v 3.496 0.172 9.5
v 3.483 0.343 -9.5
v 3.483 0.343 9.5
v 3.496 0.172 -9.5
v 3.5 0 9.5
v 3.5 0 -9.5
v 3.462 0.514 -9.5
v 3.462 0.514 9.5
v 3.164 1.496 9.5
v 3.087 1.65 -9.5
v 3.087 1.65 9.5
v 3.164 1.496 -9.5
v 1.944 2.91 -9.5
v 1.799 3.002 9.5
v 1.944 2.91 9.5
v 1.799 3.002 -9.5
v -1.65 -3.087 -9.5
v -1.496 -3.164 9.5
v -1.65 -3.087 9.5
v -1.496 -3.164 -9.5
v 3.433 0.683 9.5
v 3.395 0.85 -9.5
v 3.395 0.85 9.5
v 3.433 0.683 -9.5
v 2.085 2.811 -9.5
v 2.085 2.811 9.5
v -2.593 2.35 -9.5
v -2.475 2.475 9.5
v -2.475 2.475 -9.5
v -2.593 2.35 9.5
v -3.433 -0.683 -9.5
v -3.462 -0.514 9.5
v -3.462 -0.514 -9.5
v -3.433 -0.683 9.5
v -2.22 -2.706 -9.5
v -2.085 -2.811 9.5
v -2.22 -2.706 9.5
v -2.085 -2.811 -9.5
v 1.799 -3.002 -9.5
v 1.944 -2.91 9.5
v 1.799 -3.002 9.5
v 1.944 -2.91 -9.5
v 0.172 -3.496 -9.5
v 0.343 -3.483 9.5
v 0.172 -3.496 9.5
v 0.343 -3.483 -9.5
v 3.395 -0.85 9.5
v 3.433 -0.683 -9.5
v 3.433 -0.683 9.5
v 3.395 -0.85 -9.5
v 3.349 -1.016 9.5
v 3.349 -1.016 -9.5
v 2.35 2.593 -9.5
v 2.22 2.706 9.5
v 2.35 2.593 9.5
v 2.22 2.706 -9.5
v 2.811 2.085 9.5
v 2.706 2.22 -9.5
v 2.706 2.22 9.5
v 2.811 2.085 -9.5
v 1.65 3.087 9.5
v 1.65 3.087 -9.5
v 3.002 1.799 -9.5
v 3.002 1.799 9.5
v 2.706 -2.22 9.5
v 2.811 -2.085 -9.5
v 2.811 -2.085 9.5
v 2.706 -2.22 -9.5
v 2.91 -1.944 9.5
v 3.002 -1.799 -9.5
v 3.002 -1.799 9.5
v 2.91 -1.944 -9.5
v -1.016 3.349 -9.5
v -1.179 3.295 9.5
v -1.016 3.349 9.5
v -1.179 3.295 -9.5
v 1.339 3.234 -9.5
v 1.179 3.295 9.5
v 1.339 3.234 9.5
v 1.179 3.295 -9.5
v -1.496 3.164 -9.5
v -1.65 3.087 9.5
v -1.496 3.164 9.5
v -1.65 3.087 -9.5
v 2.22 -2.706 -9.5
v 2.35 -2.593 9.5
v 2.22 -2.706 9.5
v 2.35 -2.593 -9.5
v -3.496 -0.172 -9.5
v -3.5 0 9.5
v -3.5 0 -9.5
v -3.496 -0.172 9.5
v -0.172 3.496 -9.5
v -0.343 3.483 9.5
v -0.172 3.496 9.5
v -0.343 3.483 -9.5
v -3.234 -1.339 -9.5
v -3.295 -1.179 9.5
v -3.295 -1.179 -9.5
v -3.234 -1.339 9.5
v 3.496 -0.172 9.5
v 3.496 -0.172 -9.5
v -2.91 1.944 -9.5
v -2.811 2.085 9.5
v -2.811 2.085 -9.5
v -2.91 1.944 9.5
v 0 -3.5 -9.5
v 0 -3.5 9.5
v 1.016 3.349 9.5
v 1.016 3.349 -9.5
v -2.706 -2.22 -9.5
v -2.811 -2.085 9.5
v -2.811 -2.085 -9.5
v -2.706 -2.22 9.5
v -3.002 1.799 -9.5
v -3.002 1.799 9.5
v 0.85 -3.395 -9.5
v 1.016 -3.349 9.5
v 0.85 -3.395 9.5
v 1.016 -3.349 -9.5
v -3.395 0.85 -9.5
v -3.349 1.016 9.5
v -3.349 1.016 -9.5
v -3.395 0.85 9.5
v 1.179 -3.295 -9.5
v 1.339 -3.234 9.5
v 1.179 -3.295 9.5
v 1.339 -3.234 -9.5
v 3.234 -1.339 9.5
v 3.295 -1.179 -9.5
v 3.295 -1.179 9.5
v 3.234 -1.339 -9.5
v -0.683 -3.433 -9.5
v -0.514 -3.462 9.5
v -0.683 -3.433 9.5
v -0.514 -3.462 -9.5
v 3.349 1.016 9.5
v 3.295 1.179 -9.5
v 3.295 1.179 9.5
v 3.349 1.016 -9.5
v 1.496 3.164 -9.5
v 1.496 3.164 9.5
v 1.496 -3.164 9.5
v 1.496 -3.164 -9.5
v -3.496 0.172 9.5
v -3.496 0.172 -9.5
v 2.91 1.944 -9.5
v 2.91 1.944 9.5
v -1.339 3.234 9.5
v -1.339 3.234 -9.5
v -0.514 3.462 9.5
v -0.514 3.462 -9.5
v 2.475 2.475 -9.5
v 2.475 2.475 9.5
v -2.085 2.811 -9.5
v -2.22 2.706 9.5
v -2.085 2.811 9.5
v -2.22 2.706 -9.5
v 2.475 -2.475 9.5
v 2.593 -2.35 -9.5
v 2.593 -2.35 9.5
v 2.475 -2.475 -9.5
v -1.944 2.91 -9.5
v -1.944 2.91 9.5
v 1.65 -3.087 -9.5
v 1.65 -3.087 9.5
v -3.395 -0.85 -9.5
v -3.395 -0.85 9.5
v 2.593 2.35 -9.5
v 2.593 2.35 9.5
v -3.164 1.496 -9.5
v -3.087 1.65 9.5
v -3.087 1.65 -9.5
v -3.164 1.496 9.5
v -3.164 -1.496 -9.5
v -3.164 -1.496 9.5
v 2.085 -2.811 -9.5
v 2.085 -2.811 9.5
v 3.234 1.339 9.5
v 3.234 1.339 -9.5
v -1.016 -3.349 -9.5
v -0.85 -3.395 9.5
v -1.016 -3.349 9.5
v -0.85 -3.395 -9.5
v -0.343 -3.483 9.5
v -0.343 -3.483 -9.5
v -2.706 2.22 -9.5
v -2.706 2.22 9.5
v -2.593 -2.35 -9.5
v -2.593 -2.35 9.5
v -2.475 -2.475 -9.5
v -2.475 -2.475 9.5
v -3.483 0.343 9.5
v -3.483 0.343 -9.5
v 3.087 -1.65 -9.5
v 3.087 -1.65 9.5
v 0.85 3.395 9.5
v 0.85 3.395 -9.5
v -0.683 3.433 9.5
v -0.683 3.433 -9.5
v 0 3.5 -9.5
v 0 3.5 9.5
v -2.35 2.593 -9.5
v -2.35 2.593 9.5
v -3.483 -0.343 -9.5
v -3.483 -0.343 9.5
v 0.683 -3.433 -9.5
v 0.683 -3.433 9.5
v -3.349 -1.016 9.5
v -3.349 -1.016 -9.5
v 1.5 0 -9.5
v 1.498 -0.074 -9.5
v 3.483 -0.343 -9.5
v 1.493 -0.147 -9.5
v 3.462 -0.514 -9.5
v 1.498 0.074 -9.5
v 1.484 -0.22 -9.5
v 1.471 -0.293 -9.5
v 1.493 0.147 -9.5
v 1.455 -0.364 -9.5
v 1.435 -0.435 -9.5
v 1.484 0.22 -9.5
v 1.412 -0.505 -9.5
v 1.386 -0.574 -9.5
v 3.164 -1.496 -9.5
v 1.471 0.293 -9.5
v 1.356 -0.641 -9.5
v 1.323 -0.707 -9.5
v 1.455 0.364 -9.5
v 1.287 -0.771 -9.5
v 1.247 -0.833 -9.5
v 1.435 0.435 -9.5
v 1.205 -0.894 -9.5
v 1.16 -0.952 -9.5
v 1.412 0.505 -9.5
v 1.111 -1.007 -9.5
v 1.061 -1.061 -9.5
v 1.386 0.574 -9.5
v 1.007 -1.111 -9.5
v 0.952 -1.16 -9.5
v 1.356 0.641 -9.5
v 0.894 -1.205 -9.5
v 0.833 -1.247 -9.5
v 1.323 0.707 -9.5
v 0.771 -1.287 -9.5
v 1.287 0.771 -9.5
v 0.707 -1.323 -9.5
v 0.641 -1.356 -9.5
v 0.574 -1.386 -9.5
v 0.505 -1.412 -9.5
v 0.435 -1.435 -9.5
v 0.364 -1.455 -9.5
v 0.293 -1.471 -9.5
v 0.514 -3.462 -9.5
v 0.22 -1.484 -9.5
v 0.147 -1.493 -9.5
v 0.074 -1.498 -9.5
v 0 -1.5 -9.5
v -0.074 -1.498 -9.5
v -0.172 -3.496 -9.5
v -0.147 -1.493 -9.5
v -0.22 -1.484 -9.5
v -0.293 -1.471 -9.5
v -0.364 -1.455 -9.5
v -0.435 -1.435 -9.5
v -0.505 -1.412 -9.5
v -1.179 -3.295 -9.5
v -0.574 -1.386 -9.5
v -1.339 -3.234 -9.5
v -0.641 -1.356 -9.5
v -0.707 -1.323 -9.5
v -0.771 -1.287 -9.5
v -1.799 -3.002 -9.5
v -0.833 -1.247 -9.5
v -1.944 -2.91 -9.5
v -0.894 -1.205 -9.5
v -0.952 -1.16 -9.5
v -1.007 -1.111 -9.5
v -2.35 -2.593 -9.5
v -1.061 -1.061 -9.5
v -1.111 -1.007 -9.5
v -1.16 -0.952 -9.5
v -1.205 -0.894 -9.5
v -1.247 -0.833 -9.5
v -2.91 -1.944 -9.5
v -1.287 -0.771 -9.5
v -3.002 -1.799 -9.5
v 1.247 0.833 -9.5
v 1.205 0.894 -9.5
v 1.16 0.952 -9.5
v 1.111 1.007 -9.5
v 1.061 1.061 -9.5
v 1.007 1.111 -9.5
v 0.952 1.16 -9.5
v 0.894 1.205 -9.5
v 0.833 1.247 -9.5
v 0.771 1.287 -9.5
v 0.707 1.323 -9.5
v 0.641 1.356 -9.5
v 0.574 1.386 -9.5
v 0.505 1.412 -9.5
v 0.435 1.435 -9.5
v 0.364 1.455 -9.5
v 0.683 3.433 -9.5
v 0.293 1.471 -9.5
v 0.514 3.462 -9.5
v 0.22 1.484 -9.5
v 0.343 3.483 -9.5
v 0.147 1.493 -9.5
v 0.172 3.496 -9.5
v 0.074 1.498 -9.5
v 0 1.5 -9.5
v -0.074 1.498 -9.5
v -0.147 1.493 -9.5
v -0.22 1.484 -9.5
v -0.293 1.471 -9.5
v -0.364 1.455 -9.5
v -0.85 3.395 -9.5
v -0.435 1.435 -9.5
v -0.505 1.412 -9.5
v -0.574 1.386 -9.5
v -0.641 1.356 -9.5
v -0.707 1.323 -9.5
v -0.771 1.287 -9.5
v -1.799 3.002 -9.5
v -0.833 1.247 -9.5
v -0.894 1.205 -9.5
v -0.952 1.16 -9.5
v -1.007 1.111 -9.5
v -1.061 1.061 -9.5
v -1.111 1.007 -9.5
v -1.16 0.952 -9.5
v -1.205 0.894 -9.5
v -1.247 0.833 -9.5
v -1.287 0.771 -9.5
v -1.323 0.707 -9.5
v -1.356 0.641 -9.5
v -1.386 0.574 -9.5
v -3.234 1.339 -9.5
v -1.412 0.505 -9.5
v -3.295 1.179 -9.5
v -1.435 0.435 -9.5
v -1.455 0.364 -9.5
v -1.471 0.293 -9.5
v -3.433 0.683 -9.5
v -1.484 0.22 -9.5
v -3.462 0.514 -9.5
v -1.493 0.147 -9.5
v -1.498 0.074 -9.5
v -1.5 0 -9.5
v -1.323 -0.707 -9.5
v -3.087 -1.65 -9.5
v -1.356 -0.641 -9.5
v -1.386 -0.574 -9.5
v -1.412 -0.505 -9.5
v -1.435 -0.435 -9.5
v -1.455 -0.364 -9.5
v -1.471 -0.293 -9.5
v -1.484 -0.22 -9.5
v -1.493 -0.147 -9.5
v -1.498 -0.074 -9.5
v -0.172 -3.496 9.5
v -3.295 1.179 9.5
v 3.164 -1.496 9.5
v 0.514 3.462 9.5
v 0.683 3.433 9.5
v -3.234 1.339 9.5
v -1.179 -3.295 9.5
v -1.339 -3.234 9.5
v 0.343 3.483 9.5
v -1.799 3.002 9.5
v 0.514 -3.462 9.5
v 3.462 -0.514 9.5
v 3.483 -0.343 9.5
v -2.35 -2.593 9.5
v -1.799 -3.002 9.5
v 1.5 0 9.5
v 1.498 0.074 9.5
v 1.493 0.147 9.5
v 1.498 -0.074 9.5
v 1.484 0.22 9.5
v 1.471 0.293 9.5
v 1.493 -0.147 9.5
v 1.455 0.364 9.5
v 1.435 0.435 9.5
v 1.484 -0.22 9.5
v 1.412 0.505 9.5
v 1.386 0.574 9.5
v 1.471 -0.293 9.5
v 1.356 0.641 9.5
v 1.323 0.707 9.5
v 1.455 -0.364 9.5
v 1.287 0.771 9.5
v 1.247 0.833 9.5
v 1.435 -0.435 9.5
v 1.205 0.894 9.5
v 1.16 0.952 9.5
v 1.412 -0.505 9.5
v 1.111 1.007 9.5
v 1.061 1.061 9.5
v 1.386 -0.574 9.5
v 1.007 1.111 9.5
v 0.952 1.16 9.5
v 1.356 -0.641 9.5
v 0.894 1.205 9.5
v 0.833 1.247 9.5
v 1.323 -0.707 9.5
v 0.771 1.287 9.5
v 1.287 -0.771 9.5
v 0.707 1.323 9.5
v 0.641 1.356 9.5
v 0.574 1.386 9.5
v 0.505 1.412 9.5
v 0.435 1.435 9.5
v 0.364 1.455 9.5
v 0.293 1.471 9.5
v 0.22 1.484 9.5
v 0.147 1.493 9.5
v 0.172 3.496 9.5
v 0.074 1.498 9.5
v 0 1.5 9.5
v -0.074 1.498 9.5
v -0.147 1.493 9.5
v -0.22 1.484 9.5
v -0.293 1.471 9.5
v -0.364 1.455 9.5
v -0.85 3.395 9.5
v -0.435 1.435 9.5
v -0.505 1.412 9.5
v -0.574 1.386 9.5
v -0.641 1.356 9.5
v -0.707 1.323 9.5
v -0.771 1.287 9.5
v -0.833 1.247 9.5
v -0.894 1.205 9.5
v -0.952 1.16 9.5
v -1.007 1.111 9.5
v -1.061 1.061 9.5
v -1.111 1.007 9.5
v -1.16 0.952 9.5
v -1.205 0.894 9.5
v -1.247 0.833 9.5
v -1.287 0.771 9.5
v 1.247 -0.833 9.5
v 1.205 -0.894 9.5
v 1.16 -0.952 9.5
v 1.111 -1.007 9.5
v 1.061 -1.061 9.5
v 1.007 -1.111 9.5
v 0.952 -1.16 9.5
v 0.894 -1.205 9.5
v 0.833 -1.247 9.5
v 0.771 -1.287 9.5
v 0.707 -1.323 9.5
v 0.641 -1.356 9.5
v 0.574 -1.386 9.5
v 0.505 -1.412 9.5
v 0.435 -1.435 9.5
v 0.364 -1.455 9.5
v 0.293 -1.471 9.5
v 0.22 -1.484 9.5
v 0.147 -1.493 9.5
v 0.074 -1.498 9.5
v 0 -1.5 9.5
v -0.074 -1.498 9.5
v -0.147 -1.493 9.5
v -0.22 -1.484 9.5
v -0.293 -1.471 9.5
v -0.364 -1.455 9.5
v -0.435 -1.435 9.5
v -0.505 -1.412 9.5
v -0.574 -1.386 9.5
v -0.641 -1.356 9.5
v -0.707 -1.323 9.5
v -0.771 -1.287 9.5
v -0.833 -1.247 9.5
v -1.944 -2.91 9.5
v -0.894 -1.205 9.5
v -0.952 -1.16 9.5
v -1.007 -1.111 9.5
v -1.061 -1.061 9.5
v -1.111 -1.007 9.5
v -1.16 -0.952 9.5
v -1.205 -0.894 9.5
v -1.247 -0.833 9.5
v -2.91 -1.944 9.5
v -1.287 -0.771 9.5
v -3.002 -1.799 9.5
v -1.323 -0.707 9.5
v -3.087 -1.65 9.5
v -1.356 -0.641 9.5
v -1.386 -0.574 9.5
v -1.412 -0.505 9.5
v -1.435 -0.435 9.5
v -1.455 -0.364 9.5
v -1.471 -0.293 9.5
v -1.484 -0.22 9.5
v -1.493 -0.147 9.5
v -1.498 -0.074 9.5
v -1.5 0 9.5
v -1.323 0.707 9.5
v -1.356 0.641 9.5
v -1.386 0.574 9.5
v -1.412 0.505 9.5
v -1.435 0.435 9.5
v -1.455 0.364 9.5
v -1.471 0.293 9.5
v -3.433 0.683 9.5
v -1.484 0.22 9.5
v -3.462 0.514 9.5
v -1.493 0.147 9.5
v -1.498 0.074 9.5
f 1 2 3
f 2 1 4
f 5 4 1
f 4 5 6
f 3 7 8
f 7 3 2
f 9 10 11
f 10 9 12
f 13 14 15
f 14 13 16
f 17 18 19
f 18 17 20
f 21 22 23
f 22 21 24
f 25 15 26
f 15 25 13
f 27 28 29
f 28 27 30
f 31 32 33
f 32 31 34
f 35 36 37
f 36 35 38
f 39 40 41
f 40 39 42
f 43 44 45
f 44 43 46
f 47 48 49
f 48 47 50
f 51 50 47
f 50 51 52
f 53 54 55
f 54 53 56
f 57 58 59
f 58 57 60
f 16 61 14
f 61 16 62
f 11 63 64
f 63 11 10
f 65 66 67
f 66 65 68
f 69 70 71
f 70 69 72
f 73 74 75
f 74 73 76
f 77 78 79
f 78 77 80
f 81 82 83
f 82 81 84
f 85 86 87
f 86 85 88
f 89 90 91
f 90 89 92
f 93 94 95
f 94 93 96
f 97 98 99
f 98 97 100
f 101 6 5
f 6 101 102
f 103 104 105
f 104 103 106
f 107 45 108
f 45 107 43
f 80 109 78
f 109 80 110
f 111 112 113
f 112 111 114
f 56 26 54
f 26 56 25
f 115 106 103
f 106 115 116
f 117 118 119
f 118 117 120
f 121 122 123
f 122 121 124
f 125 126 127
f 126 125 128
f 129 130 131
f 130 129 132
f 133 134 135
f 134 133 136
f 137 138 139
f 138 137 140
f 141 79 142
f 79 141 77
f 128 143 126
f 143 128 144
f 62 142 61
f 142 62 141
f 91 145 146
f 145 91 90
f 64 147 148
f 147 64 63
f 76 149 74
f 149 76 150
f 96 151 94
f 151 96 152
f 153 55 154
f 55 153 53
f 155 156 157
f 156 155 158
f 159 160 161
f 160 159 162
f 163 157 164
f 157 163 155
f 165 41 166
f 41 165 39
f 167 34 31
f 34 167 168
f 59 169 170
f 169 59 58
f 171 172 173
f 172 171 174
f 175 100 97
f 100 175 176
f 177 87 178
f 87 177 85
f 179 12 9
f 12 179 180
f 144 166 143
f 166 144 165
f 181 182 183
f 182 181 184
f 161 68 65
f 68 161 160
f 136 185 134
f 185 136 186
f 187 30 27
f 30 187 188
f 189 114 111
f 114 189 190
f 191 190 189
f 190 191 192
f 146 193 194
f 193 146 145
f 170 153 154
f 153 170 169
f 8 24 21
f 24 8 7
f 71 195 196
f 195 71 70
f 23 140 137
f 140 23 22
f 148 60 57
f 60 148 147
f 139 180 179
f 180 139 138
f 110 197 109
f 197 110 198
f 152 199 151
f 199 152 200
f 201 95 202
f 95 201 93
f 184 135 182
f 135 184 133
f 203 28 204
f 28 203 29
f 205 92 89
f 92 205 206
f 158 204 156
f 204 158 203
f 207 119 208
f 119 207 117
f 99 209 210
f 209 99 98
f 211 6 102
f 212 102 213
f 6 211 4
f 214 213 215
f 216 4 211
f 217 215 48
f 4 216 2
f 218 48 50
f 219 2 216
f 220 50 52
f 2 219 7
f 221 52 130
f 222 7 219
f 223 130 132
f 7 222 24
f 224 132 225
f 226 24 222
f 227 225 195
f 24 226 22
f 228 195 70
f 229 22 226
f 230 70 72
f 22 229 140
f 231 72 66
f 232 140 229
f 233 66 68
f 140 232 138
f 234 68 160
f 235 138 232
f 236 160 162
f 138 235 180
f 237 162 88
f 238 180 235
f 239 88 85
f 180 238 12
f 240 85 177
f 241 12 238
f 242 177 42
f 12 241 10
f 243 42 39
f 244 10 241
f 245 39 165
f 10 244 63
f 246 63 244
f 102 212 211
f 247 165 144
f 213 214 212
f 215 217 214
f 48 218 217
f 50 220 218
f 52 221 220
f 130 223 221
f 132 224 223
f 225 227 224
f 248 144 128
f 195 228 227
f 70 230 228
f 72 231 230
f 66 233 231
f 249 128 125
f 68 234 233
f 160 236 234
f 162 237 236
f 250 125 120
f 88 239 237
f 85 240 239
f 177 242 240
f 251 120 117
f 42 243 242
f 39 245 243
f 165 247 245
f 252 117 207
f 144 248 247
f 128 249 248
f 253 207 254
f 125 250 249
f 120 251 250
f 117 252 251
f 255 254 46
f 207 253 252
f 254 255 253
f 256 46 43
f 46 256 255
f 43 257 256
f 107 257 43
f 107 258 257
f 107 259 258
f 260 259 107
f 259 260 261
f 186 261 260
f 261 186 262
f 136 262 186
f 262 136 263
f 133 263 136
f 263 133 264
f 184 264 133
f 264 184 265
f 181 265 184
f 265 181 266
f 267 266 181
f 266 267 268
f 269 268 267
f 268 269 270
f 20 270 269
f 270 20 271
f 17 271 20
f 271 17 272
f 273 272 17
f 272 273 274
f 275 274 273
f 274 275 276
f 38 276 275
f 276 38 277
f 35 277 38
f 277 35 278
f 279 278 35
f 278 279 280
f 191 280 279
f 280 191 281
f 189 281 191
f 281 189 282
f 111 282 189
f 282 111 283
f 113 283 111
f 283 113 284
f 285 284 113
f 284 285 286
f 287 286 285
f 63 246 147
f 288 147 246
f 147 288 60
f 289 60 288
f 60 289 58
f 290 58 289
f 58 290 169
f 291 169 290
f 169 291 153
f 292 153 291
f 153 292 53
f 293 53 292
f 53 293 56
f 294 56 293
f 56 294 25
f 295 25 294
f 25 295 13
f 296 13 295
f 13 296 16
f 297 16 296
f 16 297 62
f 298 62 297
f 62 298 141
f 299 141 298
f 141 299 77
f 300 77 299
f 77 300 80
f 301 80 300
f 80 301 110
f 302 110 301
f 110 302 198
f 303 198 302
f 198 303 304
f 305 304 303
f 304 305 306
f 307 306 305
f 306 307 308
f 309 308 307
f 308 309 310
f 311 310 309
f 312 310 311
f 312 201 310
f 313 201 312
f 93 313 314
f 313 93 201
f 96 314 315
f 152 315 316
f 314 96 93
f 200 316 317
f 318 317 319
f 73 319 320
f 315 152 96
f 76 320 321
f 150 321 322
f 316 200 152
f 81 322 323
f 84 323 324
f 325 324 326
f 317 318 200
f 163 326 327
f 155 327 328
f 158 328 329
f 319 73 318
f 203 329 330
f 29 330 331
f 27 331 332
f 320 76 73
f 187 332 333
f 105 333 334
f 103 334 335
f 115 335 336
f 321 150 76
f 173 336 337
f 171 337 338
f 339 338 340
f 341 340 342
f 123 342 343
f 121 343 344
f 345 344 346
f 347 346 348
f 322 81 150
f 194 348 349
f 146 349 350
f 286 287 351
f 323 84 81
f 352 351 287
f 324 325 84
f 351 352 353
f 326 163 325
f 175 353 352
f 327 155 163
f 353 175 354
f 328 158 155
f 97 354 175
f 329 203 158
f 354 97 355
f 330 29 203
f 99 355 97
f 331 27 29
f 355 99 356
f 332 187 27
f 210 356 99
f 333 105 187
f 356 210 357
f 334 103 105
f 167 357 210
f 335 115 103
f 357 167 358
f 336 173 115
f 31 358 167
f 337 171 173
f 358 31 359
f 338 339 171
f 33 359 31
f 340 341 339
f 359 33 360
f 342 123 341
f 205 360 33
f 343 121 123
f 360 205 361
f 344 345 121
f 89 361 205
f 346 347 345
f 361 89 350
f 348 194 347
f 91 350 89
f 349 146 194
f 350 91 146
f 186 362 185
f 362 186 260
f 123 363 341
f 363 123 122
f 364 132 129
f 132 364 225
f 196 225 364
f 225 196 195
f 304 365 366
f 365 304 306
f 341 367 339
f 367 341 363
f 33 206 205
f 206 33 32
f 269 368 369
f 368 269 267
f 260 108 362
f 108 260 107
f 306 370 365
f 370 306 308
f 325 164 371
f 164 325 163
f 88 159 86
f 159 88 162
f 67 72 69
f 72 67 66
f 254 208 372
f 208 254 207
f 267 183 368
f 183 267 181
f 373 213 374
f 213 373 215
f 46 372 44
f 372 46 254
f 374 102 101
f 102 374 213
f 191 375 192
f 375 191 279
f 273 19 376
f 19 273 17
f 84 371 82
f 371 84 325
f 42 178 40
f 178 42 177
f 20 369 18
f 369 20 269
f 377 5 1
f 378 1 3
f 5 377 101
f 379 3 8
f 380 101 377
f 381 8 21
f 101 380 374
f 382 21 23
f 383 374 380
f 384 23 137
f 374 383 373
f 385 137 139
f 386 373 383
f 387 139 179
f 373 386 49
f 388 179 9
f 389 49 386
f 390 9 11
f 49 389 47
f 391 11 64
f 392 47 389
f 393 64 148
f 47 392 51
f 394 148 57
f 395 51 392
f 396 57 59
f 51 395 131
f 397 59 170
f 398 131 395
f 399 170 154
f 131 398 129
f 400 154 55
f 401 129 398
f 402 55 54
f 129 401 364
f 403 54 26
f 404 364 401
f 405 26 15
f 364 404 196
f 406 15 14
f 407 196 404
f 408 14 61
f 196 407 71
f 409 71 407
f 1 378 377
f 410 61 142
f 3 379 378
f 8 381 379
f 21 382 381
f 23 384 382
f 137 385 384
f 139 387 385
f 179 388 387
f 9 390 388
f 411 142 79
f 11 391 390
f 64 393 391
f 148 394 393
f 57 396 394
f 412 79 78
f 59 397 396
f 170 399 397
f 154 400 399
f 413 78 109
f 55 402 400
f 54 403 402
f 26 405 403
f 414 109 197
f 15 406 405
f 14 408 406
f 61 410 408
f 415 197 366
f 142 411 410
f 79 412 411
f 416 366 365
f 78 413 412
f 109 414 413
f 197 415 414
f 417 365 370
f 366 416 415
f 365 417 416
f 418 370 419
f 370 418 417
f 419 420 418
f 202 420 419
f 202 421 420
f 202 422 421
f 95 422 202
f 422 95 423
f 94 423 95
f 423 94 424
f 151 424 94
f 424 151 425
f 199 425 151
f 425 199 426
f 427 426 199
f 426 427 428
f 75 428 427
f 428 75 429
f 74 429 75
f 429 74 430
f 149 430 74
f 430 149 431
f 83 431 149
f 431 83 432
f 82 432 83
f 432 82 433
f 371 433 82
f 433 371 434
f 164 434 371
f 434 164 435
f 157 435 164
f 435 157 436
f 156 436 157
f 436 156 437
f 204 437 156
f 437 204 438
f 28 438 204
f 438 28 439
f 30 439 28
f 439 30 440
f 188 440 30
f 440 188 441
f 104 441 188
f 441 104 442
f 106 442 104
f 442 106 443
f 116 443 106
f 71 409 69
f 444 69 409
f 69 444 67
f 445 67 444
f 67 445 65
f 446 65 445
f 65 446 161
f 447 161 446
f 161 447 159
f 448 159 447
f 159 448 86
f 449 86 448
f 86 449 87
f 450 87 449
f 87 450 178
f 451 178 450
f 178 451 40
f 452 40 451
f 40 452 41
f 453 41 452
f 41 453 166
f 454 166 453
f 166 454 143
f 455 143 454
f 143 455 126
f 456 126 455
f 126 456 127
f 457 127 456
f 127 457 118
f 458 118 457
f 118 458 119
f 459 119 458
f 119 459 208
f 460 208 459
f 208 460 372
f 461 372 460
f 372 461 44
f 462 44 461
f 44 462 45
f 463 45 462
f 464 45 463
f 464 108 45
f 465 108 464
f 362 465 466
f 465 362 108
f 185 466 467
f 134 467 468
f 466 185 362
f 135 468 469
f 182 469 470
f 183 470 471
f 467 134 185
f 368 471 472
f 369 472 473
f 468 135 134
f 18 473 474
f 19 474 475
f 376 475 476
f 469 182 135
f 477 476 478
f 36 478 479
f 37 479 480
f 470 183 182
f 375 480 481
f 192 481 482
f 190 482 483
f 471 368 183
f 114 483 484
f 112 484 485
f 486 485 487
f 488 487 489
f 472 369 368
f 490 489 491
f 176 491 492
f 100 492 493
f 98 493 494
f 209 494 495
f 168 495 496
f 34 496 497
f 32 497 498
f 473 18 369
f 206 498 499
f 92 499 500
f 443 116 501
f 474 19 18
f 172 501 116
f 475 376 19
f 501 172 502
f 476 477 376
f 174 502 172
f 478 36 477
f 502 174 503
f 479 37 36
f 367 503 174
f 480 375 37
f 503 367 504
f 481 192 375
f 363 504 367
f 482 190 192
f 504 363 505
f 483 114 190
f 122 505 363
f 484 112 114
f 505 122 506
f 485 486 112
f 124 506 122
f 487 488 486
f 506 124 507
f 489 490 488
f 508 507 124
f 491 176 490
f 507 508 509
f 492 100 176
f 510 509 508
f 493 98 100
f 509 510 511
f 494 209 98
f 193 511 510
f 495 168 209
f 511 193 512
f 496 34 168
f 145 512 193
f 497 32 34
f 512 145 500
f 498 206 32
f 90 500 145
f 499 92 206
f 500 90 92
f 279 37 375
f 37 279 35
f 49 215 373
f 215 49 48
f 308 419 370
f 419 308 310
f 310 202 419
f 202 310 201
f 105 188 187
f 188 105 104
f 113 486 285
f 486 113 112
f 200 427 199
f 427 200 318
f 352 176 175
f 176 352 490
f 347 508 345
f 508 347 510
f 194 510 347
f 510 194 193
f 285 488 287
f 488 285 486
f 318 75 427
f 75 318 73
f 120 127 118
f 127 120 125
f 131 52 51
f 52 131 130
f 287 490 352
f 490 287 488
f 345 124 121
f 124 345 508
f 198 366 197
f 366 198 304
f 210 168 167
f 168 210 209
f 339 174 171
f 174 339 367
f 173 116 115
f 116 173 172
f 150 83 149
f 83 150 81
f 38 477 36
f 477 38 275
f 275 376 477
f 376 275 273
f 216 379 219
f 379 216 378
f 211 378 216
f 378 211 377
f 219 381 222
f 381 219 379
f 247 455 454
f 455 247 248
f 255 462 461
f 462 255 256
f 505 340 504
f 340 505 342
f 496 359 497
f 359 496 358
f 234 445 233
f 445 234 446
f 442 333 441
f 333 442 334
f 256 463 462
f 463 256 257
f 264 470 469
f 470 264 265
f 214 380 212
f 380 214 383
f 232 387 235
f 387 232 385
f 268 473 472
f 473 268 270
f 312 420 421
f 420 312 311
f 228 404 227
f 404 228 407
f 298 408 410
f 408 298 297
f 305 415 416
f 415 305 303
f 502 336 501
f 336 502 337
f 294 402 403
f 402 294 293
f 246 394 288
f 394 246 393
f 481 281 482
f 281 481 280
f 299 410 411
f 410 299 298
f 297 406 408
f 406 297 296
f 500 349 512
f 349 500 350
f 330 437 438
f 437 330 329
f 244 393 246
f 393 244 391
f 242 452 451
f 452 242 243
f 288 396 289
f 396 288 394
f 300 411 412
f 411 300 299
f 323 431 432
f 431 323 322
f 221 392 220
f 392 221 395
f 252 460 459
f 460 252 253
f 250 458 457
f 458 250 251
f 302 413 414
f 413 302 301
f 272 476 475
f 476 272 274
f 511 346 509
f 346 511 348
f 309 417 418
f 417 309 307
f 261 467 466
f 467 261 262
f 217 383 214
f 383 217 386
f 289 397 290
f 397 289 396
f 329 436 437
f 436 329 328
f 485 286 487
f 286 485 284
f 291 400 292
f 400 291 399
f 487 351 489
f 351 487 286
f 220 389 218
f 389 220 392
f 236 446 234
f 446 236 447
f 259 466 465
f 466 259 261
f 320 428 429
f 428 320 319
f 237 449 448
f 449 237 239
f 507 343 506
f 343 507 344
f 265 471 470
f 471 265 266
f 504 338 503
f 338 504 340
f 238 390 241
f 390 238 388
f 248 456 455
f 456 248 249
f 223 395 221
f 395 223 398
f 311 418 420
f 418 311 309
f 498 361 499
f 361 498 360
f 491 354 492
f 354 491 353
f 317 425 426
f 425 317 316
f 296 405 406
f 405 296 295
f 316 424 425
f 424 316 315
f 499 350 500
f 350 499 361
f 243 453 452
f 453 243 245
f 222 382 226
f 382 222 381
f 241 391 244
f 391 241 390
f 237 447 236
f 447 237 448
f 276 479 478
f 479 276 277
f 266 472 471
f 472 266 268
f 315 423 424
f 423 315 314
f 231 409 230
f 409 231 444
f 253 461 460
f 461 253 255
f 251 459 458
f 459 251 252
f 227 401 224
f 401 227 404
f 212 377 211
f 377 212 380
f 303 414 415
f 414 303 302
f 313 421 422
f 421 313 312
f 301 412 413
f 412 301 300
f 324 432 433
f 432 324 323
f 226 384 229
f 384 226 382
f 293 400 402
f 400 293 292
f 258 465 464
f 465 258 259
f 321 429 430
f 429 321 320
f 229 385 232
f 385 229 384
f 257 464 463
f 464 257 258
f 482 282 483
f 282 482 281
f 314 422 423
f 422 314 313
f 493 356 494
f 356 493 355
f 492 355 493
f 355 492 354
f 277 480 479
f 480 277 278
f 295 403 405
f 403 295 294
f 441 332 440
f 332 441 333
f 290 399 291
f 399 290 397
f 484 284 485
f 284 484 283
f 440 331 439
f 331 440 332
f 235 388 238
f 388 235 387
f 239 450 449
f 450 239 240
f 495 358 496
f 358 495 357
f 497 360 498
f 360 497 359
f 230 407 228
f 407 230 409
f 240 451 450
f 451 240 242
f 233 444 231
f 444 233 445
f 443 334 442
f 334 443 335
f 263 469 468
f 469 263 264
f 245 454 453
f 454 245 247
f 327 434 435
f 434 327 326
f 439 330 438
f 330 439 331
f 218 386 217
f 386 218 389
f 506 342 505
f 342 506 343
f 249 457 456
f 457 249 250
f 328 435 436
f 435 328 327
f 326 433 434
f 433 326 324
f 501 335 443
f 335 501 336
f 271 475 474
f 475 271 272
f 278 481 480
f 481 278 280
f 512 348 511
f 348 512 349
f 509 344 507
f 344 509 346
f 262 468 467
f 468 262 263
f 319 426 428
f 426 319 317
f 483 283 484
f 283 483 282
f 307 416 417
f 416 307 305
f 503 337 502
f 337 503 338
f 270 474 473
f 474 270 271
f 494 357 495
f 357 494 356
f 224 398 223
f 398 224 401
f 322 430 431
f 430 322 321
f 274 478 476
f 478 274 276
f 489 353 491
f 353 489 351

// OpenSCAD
// Long linear bearing sleeve
// 3.0mm bore, 7.0mm outer diameter, 19.0mm length

bearing_length = 19.0;
outer_diameter = 7.0;
bore_diameter  = 3.0;

outer_radius = outer_diameter / 2;
bore_radius  = bore_diameter  / 2;

cut_extra = 0.5;   // extend bore beyond ends to guarantee a clean through-hole
$fn = 128;

module linear_bearing_sleeve(len, ro, ri) {
    difference() {
        cylinder(h=len, r=ro, center=true);
        cylinder(h=len + 2*cut_extra, r=ri, center=true);
    }
}

linear_bearing_sleeve(bearing_length, outer_radius, bore_radius);
